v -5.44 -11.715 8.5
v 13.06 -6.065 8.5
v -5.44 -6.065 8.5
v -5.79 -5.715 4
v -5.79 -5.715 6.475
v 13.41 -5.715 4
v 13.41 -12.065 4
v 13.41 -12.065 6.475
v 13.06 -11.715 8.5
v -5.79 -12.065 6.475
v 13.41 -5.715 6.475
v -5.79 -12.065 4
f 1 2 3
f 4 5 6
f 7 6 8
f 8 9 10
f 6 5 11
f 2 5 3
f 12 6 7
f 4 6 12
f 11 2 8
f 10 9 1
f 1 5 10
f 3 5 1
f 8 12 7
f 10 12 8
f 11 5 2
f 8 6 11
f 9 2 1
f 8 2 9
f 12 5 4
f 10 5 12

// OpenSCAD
// DIP chip, standing in a 7.62 mm (300 mil) socket of the TS06 boards. Made for 3d/populated.
//
// layers: body=#1c1c1e leads=#bcc0c4 mark=#8e8e93
// variants: dip_chip_4 N=4 ; dip_chip_8 N=8 ; dip_chip_16 N=16 ; dip_chip_28 N=28
//
// FRAME  KiCad model frame (mm, x right, y up = a footprint's y negated, z up from the board face).
//        Pin 1 at (0, 0), the left column goes down the page (y -2.54 each), the right column is at x 7.62:
//        the pad layout of every TS06_DIP-N_W7.62mm_Socket footprint. The pre-rotated _R90/_R180/_R270
//        footprints reach this through tools/models3d.py's variant rule.
//
// DIMENSIONS              value                       kind
//   SEAT  4.0             socket top above the board  MEASURED: the KiCad DIP-N_W7.62mm_Socket models, read back from a
//                         face                        GLB export of TS06-DRV (socket top 5.6 mm, board face 1.6 mm)
//   H     4.5             chip body, seating plane    INFERRED: JEDEC MS-001 plastic DIP is 4.57 mm max; chosen so that
//                         to top                      socket + chip is 8.5 mm, the figure 3d/case-pair/case_pair.py FP_H uses
//   W     6.35 (7.11 N=28) body width               INFERRED: JEDEC MS-001 (PDIP, 300 mil) 6.35 mm; the skinny
//                                                     28-pin SPDIP (MCP23017-E/SP) is 7.11 mm
//   LEN   4.6 / 9.3 / 19.2 / 34.7                     INFERRED: typical body length for 4 / 8 / 16 / 28 pins (DIP-4
//                                                     optocoupler, PDIP-8, PDIP-16, SPDIP-28)
//   leads 0.5 x 0.3 mm, 3.5 mm into the socket        INFERRED: typical DIP lead
// Not drawn: the pin-1 notch (a dot marks pin 1), the leads' kink, the package's mould draft.
N = 16;
L = "body";
SEAT = 4.0;
H = 4.5;
W = (N == 28) ? 7.11 : 6.35;
LEN = (N == 4) ? 4.6 : (N == 8) ? 9.3 : (N == 16) ? 19.2 : 34.7;
P = 2.54;
cy = -(N / 2 - 1) * P / 2;            // body centre, y
cx = 3.81;

module body() {
    translate([cx, cy, SEAT])
    hull() {
        translate([-LEN / 2, -W / 2, 0]) cube([LEN, W, H * 0.55]);
        translate([-LEN / 2 + 0.35, -W / 2 + 0.35, 0]) cube([LEN - 0.7, W - 0.7, H]);
    }
}

module lead(px, py, side) {            // side -1 left column, +1 right column
    bx = cx + side * (W / 2 - 0.05);
    hull() {
        translate([bx - 0.15, py - 0.25, SEAT + 1.0]) cube([0.3, 0.5, 0.3]);
        translate([px - 0.15, py - 0.25, SEAT - 3.5]) cube([0.3, 0.5, 0.1]);
    }
}

if (L == "body") body();
if (L == "leads") for (i = [0 : N / 2 - 1]) {
    lead(0, -i * P, -1);
    lead(7.62, -i * P, 1);
}
// pin-1 dot: top face, left column side, at the pin-1 end (the +y end of the body)
if (L == "mark") translate([cx - W / 2 + 1.1, cy + LEN / 2 - 1.1, SEAT + H - 0.02])
    cylinder(d = 0.9, h = 0.06, $fn = 16);
